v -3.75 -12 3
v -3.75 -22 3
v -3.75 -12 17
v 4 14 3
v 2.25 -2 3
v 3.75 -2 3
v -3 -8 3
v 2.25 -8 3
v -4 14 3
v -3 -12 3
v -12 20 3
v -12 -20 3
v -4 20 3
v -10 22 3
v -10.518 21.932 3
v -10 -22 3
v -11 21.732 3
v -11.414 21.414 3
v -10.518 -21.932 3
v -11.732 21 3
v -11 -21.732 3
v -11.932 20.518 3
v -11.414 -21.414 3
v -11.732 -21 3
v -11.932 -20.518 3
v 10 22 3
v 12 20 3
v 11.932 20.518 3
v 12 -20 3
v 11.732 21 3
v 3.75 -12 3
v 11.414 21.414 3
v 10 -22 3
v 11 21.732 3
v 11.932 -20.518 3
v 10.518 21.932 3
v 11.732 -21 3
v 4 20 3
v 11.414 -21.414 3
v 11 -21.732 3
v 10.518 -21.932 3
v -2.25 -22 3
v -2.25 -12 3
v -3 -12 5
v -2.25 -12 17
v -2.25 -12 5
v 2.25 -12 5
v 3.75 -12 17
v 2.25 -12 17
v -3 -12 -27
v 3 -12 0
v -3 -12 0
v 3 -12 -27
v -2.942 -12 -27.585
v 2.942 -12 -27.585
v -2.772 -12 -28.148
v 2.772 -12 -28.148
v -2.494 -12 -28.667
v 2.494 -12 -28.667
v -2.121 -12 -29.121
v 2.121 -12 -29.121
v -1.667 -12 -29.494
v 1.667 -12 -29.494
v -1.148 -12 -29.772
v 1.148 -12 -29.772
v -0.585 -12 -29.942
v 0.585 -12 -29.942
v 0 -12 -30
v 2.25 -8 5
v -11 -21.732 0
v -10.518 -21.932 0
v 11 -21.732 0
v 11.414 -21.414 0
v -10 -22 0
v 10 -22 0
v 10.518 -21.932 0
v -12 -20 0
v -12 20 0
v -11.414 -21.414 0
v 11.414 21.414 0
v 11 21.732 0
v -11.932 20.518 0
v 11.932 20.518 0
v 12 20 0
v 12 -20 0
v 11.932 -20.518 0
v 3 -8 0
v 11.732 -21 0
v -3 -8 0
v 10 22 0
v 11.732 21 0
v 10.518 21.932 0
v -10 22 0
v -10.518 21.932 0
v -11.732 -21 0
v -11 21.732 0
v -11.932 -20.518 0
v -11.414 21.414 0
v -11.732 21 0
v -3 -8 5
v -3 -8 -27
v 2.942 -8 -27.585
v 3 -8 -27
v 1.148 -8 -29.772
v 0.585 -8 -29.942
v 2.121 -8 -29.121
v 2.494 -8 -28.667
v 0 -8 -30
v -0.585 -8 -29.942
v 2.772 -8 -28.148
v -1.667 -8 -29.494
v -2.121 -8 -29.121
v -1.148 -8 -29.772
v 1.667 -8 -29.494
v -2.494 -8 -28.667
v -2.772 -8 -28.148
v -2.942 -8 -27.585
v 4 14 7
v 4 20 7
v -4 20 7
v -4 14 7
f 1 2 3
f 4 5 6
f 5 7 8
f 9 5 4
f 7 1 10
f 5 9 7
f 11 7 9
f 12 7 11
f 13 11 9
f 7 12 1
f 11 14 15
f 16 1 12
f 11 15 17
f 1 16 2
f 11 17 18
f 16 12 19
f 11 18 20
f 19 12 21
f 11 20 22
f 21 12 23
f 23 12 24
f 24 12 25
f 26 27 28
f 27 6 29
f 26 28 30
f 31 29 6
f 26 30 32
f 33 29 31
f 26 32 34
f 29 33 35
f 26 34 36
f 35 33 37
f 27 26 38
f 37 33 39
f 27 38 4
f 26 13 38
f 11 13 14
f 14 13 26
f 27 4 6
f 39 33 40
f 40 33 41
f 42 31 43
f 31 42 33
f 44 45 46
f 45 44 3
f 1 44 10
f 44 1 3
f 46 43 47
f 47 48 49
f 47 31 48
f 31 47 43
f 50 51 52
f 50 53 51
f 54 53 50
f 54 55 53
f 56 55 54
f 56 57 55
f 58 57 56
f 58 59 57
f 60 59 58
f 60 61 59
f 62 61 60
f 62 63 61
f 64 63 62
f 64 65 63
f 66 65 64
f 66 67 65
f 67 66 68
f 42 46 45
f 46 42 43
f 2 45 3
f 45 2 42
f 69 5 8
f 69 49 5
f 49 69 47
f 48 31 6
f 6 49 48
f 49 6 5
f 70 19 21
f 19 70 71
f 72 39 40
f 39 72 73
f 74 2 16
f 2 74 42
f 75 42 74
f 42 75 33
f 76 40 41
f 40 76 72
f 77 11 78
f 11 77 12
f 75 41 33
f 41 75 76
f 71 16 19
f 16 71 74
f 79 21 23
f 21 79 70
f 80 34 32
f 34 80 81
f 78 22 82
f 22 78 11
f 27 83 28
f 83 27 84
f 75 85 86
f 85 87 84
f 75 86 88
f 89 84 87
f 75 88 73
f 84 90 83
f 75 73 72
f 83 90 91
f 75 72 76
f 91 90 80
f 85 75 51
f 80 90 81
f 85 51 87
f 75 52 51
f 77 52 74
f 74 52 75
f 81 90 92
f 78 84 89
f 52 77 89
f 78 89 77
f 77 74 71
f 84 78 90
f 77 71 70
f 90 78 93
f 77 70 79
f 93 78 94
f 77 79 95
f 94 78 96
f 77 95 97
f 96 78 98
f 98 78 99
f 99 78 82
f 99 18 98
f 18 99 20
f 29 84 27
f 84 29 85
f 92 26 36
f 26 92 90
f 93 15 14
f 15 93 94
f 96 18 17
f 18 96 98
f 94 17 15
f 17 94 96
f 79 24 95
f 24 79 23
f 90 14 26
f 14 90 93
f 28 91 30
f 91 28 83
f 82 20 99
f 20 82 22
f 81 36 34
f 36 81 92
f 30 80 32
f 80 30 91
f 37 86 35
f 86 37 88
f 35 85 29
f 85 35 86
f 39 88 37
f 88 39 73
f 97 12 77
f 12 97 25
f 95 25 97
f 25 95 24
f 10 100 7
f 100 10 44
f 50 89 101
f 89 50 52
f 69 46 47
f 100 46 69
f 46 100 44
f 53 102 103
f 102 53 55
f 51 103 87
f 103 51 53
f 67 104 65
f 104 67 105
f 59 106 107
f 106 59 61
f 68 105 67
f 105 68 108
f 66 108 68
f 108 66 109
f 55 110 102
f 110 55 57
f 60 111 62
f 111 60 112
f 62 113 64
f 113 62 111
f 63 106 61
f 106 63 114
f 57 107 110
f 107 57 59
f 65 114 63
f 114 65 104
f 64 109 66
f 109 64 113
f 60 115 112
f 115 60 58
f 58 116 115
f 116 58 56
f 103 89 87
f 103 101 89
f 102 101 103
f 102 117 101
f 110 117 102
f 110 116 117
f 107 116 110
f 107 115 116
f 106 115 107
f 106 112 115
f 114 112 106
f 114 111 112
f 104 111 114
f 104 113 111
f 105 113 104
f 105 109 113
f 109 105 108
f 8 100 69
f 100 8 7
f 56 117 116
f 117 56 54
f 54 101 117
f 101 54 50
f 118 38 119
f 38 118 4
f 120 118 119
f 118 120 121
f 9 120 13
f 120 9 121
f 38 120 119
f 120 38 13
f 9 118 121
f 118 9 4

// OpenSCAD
// Test model: wall hook with a back plate, a hull-shaped arm and a mirrored pair of fins.
module plate() { linear_extrude(3) offset(r = 2, $fn = 24) square([20, 40], center = true); }
module arm2d() { hull() { square([6, 4], center = true); translate([0, 30]) circle(d = 6, $fn = 32); } }
module fin() { polygon([[0, 0], [10, 0], [0, 14]]); }

plate();
translate([0, -10, 3]) rotate([-90, 0, 0]) rotate([0, 0, 0]) linear_extrude(4, center = true) arm2d();
for (s = [-1, 1]) translate([s * 3, -12, 3]) rotate([90, 0, 90]) linear_extrude(1.5, center = true) mirror([s < 0 ? 1 : 0, 0]) fin();
translate([-4, 14, 3]) cube([8, 6, 4]);
